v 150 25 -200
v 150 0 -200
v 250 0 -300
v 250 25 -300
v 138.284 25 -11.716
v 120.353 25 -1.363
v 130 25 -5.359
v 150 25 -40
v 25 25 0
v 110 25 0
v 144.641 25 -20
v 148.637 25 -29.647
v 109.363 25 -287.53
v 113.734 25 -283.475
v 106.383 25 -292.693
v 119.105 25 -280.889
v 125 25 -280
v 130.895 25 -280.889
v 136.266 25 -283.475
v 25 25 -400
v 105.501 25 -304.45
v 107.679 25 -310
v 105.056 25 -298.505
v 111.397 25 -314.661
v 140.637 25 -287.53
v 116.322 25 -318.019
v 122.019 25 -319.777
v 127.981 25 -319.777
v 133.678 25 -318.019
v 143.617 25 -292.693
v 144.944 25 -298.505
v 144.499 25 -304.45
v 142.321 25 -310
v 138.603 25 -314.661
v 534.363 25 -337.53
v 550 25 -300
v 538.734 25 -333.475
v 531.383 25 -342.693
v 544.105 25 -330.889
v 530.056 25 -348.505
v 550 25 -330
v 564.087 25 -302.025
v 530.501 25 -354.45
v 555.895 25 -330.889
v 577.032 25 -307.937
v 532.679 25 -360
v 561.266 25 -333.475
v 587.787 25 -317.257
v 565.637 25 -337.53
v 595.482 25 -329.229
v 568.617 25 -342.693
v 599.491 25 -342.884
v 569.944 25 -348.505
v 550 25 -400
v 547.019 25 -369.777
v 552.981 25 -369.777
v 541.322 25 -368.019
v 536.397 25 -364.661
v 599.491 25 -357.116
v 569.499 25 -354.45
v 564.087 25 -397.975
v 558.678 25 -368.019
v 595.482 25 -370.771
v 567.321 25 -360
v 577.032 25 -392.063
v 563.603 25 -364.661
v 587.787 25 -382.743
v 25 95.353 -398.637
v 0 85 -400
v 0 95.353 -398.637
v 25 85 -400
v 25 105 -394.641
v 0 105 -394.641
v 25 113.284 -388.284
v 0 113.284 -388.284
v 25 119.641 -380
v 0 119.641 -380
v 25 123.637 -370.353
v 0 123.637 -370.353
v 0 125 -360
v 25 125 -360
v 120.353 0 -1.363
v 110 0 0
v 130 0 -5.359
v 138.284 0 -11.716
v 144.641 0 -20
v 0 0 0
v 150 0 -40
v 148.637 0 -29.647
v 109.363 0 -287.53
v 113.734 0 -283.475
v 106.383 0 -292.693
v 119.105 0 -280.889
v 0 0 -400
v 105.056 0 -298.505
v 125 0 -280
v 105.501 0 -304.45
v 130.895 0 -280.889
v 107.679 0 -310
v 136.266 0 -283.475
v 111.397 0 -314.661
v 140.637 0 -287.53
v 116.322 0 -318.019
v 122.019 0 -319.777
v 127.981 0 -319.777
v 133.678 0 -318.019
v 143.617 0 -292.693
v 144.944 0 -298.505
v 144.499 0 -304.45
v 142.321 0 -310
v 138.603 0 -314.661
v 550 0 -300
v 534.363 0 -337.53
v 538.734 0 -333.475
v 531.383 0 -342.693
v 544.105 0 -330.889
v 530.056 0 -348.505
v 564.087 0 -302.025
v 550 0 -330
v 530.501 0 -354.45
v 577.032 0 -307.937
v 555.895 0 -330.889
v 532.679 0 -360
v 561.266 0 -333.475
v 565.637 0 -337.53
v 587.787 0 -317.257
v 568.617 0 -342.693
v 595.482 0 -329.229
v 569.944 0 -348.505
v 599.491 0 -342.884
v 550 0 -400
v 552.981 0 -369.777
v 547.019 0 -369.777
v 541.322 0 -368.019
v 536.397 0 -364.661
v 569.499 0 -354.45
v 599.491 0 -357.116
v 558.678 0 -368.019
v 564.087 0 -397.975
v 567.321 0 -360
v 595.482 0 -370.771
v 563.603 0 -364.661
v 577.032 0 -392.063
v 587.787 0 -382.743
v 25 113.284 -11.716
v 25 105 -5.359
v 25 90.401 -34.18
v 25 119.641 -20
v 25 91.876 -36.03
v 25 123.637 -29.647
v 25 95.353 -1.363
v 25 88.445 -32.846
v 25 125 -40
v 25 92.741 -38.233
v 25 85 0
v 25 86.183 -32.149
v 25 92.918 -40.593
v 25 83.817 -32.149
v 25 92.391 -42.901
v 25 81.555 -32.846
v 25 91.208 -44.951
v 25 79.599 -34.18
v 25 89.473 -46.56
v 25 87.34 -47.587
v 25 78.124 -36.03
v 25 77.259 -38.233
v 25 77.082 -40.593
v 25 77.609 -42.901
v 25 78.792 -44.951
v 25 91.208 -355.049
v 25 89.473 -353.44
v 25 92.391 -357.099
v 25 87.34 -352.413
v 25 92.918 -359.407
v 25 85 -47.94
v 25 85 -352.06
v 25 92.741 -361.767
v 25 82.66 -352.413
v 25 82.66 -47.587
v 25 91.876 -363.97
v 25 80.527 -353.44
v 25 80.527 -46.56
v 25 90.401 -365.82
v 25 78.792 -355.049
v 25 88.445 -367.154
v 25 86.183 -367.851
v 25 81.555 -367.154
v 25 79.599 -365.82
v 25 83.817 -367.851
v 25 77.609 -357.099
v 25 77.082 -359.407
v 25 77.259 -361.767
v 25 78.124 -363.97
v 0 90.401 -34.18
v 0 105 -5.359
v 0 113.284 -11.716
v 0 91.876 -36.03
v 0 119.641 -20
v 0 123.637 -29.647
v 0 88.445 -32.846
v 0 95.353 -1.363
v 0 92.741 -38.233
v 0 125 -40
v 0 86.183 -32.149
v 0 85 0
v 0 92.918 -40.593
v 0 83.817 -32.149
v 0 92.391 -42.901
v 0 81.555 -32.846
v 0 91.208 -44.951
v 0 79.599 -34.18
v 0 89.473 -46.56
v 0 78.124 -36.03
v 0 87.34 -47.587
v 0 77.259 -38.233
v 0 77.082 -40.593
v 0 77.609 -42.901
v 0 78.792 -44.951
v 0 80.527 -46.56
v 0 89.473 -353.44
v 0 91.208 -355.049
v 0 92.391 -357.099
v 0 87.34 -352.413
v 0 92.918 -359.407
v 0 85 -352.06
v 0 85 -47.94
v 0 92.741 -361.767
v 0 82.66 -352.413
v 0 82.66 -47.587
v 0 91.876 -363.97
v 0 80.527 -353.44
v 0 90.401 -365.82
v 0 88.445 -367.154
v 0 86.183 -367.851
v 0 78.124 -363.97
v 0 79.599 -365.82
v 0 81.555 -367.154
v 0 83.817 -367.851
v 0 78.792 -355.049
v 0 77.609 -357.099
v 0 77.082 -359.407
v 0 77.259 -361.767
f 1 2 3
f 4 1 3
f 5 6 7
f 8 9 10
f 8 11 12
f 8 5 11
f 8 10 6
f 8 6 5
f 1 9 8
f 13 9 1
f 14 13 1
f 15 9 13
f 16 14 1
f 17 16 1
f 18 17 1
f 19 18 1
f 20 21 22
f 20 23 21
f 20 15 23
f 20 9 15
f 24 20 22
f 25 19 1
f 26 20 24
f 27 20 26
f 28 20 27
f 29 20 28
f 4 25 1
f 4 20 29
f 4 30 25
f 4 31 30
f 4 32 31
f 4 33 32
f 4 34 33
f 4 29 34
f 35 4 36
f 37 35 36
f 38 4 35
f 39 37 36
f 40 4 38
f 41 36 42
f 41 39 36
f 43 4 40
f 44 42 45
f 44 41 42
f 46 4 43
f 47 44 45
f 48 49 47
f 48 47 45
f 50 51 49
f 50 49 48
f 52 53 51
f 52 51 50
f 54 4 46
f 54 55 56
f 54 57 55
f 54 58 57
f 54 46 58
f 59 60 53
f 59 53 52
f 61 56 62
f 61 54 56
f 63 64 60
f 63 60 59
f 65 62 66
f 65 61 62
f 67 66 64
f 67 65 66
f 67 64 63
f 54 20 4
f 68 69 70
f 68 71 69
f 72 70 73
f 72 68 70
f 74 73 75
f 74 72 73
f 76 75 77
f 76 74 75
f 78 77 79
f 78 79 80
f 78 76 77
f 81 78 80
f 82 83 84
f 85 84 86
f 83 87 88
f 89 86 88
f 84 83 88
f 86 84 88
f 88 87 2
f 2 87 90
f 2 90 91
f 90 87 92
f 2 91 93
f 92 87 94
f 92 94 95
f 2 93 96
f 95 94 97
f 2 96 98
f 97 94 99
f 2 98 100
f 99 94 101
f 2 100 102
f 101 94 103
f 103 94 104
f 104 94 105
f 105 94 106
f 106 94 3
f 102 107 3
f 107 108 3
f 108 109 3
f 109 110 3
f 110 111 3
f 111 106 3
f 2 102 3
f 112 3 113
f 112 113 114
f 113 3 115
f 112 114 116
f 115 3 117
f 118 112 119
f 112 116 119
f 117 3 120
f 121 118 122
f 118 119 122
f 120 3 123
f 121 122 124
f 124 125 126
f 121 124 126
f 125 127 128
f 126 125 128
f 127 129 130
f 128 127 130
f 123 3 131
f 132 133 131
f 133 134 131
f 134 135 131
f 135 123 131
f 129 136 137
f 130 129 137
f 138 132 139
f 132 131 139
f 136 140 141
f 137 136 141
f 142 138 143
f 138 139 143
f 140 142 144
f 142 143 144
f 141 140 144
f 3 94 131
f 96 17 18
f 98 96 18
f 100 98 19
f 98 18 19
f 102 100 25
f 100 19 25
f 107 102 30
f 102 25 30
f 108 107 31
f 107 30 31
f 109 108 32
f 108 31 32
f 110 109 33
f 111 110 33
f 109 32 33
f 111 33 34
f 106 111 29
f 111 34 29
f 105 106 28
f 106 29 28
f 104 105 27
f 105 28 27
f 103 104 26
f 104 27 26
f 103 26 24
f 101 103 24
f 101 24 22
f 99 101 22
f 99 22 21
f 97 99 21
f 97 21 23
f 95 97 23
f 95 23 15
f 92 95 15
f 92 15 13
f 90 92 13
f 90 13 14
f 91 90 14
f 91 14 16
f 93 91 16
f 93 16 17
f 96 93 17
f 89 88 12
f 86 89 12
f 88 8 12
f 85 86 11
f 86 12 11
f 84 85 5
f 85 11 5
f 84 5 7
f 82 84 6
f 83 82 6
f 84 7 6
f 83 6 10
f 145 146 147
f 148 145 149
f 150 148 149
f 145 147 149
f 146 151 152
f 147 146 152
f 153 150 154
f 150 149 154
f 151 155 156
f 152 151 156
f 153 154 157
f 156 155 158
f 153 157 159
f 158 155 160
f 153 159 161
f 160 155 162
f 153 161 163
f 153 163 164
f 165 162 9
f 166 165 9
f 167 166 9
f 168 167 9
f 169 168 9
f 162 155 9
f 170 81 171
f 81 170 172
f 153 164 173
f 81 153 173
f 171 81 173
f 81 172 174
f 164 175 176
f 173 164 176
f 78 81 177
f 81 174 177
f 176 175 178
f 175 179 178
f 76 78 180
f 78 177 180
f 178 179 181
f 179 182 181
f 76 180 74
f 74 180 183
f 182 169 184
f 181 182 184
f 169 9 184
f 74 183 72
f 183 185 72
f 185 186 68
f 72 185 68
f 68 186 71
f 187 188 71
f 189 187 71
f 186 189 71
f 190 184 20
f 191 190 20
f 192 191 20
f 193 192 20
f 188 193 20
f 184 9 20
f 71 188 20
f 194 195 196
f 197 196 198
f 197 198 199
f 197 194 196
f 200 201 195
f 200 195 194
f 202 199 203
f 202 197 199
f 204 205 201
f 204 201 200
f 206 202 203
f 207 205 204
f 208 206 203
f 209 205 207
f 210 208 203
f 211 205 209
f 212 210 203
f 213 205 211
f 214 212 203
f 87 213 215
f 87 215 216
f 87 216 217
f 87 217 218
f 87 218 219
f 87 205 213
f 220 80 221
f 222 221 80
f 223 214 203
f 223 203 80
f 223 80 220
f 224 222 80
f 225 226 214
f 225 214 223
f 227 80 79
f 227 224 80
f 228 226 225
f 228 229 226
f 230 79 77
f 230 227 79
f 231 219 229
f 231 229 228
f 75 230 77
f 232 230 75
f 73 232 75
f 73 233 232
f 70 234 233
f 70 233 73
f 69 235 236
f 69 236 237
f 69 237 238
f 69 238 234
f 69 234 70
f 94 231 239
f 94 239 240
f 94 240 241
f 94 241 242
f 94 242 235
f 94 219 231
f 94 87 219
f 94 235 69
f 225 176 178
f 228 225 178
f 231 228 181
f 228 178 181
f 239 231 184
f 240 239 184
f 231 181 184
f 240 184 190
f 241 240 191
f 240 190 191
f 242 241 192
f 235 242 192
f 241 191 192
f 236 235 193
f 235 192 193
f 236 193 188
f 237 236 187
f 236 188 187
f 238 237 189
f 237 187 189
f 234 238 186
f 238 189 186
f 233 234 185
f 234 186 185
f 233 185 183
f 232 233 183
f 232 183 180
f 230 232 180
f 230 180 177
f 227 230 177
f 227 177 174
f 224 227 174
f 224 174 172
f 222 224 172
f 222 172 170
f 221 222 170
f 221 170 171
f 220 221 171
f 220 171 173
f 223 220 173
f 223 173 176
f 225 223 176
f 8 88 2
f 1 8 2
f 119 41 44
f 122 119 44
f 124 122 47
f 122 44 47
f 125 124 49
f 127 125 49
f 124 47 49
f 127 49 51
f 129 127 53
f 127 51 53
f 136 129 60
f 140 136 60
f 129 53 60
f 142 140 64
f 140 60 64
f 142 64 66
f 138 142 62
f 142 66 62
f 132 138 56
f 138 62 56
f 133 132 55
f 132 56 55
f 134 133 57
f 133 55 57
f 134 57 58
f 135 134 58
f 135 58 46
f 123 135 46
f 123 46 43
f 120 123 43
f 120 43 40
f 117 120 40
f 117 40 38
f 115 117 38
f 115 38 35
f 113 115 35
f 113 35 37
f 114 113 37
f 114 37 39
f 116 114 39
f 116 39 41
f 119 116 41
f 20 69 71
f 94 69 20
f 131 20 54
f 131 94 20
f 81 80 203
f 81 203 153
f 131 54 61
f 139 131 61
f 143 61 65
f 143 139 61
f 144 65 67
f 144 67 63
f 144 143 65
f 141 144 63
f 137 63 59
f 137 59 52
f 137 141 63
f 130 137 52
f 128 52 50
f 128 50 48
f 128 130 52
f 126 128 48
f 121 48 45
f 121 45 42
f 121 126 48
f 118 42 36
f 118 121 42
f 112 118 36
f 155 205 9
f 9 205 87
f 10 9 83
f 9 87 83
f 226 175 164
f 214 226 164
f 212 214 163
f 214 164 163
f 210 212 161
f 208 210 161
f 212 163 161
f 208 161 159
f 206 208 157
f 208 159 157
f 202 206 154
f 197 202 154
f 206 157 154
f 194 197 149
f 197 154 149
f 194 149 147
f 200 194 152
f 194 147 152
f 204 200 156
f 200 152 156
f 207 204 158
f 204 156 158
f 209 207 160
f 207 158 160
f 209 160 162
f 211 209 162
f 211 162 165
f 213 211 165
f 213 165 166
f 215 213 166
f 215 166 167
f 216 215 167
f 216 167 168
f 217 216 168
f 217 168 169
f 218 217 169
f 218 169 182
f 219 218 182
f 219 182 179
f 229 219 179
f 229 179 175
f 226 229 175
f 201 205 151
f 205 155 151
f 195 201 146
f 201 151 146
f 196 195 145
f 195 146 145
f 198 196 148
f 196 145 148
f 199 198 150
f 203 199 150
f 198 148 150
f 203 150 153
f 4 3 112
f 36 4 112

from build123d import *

# Parameters (mm, degrees)
BOSS_EXTRUDE2_DEPTH = 25
SKETCH1_4_W         = 25
SKETCH1_4_H         = 400
BOSS_EXTRUDE3_DEPTH = 125
FILLET1_R           = 40
SKETCH2_R           = 20
CUT_EXTRUDE1_DEPTH  = 729.010988928
FILLET2_R           = 40
SKETCH3_R           = 7.94
CUT_EXTRUDE2_DEPTH  = 712.512473538


with BuildPart() as part:
    # Sketch1 → Boss-Extrude2 (new body)
    with BuildSketch(Plane(origin=(0, 0, 0), x_dir=(1, 0, 0), z_dir=(0, 1, 0))):
        with BuildLine():
            Line((25, 400), (25, 0))
            Line((25, 0), (150, 0))
            Line((150, 0), (150, 200))
            Line((150, 200), (250, 300))
            Line((250, 300), (550, 300))
            ThreePointArc((550, 300), (600, 350), (550, 400))
            Line((550, 400), (25, 400))
        make_face()
    extrude(amount=BOSS_EXTRUDE2_DEPTH)

    # Sketch1<4> → Boss-Extrude3 (add)
    with BuildSketch(Plane(origin=(0, 0, 0), x_dir=(1, 0, 0), z_dir=(0, 1, 0))):
        with Locations((12.5, 200)):
            Rectangle(SKETCH1_4_W, SKETCH1_4_H)
    extrude(amount=BOSS_EXTRUDE3_DEPTH)

    # Fillet1
    fillet1_edges = [part.edges().sort_by_distance(p)[0] for p in [
        (150, 12.5, 0),
    ]]
    fillet(fillet1_edges, radius=FILLET1_R)

    # Sketch2 → Cut-Extrude1 (cut, through all)
    with BuildSketch(Plane(origin=(0, 25, 0), x_dir=(1, 0, 0), z_dir=(0, 1, 0))):
        with Locations((550, 350)):
            Circle(SKETCH2_R)
        with Locations((125, 300)):
            Circle(SKETCH2_R)
    extrude(amount=-CUT_EXTRUDE1_DEPTH, mode=Mode.SUBTRACT)

    # Fillet2
    fillet2_edges = [part.edges().sort_by_distance(p)[0] for p in [
        (12.5, 125, 0),
        (12.5, 125, -400),
    ]]
    fillet(fillet2_edges, radius=FILLET2_R)

    # Sketch3 → Cut-Extrude2 (cut, through all)
    with BuildSketch(Plane(origin=(25, 0, 0), x_dir=(0, 0, -1), z_dir=(1, 0, 0))):
        with Locations((40, 85)):
            Circle(SKETCH3_R)
        with Locations((360, 85)):
            Circle(SKETCH3_R)
    extrude(amount=-CUT_EXTRUDE2_DEPTH, mode=Mode.SUBTRACT)


solid = part.part
